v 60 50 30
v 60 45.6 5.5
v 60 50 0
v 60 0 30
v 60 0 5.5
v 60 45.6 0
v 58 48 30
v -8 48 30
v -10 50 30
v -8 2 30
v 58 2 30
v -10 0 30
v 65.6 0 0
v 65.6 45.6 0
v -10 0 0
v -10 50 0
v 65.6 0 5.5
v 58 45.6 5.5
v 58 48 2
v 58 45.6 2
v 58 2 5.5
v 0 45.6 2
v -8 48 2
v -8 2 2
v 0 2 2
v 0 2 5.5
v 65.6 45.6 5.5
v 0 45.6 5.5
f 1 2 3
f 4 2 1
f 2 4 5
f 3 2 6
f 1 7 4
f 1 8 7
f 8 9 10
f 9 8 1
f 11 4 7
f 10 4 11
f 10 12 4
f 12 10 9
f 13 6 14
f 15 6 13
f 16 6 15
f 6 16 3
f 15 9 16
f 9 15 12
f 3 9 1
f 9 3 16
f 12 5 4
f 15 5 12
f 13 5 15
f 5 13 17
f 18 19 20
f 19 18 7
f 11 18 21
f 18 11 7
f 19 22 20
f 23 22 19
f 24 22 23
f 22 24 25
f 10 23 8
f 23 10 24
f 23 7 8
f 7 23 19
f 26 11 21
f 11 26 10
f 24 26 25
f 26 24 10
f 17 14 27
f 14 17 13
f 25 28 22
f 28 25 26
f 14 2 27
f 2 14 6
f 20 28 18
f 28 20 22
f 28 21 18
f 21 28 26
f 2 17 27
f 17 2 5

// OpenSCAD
// Two-part enclosure for small electronics board
// Print orientation: both parts flat on bed, lid on +X side of box

$fn = 64;

// ---- Box ----
box_x = 70;      // outer length (X)
box_y = 50;      // outer width (Y)
box_z = 30;      // outer height (Z)
wall = 2;        // wall thickness
floor = 2;       // floor thickness

// ---- Lid ----
lip_w = 65.6;    // lip outer length (X)
lip_d = 45.6;    // lip outer width (Y)
lip_h = 4;       // lip height (Z)
lip_t = 1.5;     // lip wall thickness

// ---- Misc ----
eps = 0.5;       // cutter overshoot
gap = 10;        // gap between parts on bed

// Derived
inner_x = box_x - 2 * wall;
inner_y = box_y - 2 * wall;
lip_f  = lip_w - box_x + 0.4;  // clearance split (0.2 each side)
lip_d2 = lip_d - box_y + 0.4;

module box() {
    difference() {
        cube([box_x, box_y, box_z]);
        translate([wall, wall, floor])
            cube([inner_x, inner_y, box_z - floor]);   // open top
    }
}

module lid() {
    translate([0, 0, 0])
        cube([lip_w, lip_d, lip_t]);                   // plate
    translate([0, 0, lip_t])
        cube([lip_w, lip_d, lip_h]);                   // lip
}

union() {
    translate([-gap, 0, 0]) box();
    translate([0, 0, 0]) lid();
}
